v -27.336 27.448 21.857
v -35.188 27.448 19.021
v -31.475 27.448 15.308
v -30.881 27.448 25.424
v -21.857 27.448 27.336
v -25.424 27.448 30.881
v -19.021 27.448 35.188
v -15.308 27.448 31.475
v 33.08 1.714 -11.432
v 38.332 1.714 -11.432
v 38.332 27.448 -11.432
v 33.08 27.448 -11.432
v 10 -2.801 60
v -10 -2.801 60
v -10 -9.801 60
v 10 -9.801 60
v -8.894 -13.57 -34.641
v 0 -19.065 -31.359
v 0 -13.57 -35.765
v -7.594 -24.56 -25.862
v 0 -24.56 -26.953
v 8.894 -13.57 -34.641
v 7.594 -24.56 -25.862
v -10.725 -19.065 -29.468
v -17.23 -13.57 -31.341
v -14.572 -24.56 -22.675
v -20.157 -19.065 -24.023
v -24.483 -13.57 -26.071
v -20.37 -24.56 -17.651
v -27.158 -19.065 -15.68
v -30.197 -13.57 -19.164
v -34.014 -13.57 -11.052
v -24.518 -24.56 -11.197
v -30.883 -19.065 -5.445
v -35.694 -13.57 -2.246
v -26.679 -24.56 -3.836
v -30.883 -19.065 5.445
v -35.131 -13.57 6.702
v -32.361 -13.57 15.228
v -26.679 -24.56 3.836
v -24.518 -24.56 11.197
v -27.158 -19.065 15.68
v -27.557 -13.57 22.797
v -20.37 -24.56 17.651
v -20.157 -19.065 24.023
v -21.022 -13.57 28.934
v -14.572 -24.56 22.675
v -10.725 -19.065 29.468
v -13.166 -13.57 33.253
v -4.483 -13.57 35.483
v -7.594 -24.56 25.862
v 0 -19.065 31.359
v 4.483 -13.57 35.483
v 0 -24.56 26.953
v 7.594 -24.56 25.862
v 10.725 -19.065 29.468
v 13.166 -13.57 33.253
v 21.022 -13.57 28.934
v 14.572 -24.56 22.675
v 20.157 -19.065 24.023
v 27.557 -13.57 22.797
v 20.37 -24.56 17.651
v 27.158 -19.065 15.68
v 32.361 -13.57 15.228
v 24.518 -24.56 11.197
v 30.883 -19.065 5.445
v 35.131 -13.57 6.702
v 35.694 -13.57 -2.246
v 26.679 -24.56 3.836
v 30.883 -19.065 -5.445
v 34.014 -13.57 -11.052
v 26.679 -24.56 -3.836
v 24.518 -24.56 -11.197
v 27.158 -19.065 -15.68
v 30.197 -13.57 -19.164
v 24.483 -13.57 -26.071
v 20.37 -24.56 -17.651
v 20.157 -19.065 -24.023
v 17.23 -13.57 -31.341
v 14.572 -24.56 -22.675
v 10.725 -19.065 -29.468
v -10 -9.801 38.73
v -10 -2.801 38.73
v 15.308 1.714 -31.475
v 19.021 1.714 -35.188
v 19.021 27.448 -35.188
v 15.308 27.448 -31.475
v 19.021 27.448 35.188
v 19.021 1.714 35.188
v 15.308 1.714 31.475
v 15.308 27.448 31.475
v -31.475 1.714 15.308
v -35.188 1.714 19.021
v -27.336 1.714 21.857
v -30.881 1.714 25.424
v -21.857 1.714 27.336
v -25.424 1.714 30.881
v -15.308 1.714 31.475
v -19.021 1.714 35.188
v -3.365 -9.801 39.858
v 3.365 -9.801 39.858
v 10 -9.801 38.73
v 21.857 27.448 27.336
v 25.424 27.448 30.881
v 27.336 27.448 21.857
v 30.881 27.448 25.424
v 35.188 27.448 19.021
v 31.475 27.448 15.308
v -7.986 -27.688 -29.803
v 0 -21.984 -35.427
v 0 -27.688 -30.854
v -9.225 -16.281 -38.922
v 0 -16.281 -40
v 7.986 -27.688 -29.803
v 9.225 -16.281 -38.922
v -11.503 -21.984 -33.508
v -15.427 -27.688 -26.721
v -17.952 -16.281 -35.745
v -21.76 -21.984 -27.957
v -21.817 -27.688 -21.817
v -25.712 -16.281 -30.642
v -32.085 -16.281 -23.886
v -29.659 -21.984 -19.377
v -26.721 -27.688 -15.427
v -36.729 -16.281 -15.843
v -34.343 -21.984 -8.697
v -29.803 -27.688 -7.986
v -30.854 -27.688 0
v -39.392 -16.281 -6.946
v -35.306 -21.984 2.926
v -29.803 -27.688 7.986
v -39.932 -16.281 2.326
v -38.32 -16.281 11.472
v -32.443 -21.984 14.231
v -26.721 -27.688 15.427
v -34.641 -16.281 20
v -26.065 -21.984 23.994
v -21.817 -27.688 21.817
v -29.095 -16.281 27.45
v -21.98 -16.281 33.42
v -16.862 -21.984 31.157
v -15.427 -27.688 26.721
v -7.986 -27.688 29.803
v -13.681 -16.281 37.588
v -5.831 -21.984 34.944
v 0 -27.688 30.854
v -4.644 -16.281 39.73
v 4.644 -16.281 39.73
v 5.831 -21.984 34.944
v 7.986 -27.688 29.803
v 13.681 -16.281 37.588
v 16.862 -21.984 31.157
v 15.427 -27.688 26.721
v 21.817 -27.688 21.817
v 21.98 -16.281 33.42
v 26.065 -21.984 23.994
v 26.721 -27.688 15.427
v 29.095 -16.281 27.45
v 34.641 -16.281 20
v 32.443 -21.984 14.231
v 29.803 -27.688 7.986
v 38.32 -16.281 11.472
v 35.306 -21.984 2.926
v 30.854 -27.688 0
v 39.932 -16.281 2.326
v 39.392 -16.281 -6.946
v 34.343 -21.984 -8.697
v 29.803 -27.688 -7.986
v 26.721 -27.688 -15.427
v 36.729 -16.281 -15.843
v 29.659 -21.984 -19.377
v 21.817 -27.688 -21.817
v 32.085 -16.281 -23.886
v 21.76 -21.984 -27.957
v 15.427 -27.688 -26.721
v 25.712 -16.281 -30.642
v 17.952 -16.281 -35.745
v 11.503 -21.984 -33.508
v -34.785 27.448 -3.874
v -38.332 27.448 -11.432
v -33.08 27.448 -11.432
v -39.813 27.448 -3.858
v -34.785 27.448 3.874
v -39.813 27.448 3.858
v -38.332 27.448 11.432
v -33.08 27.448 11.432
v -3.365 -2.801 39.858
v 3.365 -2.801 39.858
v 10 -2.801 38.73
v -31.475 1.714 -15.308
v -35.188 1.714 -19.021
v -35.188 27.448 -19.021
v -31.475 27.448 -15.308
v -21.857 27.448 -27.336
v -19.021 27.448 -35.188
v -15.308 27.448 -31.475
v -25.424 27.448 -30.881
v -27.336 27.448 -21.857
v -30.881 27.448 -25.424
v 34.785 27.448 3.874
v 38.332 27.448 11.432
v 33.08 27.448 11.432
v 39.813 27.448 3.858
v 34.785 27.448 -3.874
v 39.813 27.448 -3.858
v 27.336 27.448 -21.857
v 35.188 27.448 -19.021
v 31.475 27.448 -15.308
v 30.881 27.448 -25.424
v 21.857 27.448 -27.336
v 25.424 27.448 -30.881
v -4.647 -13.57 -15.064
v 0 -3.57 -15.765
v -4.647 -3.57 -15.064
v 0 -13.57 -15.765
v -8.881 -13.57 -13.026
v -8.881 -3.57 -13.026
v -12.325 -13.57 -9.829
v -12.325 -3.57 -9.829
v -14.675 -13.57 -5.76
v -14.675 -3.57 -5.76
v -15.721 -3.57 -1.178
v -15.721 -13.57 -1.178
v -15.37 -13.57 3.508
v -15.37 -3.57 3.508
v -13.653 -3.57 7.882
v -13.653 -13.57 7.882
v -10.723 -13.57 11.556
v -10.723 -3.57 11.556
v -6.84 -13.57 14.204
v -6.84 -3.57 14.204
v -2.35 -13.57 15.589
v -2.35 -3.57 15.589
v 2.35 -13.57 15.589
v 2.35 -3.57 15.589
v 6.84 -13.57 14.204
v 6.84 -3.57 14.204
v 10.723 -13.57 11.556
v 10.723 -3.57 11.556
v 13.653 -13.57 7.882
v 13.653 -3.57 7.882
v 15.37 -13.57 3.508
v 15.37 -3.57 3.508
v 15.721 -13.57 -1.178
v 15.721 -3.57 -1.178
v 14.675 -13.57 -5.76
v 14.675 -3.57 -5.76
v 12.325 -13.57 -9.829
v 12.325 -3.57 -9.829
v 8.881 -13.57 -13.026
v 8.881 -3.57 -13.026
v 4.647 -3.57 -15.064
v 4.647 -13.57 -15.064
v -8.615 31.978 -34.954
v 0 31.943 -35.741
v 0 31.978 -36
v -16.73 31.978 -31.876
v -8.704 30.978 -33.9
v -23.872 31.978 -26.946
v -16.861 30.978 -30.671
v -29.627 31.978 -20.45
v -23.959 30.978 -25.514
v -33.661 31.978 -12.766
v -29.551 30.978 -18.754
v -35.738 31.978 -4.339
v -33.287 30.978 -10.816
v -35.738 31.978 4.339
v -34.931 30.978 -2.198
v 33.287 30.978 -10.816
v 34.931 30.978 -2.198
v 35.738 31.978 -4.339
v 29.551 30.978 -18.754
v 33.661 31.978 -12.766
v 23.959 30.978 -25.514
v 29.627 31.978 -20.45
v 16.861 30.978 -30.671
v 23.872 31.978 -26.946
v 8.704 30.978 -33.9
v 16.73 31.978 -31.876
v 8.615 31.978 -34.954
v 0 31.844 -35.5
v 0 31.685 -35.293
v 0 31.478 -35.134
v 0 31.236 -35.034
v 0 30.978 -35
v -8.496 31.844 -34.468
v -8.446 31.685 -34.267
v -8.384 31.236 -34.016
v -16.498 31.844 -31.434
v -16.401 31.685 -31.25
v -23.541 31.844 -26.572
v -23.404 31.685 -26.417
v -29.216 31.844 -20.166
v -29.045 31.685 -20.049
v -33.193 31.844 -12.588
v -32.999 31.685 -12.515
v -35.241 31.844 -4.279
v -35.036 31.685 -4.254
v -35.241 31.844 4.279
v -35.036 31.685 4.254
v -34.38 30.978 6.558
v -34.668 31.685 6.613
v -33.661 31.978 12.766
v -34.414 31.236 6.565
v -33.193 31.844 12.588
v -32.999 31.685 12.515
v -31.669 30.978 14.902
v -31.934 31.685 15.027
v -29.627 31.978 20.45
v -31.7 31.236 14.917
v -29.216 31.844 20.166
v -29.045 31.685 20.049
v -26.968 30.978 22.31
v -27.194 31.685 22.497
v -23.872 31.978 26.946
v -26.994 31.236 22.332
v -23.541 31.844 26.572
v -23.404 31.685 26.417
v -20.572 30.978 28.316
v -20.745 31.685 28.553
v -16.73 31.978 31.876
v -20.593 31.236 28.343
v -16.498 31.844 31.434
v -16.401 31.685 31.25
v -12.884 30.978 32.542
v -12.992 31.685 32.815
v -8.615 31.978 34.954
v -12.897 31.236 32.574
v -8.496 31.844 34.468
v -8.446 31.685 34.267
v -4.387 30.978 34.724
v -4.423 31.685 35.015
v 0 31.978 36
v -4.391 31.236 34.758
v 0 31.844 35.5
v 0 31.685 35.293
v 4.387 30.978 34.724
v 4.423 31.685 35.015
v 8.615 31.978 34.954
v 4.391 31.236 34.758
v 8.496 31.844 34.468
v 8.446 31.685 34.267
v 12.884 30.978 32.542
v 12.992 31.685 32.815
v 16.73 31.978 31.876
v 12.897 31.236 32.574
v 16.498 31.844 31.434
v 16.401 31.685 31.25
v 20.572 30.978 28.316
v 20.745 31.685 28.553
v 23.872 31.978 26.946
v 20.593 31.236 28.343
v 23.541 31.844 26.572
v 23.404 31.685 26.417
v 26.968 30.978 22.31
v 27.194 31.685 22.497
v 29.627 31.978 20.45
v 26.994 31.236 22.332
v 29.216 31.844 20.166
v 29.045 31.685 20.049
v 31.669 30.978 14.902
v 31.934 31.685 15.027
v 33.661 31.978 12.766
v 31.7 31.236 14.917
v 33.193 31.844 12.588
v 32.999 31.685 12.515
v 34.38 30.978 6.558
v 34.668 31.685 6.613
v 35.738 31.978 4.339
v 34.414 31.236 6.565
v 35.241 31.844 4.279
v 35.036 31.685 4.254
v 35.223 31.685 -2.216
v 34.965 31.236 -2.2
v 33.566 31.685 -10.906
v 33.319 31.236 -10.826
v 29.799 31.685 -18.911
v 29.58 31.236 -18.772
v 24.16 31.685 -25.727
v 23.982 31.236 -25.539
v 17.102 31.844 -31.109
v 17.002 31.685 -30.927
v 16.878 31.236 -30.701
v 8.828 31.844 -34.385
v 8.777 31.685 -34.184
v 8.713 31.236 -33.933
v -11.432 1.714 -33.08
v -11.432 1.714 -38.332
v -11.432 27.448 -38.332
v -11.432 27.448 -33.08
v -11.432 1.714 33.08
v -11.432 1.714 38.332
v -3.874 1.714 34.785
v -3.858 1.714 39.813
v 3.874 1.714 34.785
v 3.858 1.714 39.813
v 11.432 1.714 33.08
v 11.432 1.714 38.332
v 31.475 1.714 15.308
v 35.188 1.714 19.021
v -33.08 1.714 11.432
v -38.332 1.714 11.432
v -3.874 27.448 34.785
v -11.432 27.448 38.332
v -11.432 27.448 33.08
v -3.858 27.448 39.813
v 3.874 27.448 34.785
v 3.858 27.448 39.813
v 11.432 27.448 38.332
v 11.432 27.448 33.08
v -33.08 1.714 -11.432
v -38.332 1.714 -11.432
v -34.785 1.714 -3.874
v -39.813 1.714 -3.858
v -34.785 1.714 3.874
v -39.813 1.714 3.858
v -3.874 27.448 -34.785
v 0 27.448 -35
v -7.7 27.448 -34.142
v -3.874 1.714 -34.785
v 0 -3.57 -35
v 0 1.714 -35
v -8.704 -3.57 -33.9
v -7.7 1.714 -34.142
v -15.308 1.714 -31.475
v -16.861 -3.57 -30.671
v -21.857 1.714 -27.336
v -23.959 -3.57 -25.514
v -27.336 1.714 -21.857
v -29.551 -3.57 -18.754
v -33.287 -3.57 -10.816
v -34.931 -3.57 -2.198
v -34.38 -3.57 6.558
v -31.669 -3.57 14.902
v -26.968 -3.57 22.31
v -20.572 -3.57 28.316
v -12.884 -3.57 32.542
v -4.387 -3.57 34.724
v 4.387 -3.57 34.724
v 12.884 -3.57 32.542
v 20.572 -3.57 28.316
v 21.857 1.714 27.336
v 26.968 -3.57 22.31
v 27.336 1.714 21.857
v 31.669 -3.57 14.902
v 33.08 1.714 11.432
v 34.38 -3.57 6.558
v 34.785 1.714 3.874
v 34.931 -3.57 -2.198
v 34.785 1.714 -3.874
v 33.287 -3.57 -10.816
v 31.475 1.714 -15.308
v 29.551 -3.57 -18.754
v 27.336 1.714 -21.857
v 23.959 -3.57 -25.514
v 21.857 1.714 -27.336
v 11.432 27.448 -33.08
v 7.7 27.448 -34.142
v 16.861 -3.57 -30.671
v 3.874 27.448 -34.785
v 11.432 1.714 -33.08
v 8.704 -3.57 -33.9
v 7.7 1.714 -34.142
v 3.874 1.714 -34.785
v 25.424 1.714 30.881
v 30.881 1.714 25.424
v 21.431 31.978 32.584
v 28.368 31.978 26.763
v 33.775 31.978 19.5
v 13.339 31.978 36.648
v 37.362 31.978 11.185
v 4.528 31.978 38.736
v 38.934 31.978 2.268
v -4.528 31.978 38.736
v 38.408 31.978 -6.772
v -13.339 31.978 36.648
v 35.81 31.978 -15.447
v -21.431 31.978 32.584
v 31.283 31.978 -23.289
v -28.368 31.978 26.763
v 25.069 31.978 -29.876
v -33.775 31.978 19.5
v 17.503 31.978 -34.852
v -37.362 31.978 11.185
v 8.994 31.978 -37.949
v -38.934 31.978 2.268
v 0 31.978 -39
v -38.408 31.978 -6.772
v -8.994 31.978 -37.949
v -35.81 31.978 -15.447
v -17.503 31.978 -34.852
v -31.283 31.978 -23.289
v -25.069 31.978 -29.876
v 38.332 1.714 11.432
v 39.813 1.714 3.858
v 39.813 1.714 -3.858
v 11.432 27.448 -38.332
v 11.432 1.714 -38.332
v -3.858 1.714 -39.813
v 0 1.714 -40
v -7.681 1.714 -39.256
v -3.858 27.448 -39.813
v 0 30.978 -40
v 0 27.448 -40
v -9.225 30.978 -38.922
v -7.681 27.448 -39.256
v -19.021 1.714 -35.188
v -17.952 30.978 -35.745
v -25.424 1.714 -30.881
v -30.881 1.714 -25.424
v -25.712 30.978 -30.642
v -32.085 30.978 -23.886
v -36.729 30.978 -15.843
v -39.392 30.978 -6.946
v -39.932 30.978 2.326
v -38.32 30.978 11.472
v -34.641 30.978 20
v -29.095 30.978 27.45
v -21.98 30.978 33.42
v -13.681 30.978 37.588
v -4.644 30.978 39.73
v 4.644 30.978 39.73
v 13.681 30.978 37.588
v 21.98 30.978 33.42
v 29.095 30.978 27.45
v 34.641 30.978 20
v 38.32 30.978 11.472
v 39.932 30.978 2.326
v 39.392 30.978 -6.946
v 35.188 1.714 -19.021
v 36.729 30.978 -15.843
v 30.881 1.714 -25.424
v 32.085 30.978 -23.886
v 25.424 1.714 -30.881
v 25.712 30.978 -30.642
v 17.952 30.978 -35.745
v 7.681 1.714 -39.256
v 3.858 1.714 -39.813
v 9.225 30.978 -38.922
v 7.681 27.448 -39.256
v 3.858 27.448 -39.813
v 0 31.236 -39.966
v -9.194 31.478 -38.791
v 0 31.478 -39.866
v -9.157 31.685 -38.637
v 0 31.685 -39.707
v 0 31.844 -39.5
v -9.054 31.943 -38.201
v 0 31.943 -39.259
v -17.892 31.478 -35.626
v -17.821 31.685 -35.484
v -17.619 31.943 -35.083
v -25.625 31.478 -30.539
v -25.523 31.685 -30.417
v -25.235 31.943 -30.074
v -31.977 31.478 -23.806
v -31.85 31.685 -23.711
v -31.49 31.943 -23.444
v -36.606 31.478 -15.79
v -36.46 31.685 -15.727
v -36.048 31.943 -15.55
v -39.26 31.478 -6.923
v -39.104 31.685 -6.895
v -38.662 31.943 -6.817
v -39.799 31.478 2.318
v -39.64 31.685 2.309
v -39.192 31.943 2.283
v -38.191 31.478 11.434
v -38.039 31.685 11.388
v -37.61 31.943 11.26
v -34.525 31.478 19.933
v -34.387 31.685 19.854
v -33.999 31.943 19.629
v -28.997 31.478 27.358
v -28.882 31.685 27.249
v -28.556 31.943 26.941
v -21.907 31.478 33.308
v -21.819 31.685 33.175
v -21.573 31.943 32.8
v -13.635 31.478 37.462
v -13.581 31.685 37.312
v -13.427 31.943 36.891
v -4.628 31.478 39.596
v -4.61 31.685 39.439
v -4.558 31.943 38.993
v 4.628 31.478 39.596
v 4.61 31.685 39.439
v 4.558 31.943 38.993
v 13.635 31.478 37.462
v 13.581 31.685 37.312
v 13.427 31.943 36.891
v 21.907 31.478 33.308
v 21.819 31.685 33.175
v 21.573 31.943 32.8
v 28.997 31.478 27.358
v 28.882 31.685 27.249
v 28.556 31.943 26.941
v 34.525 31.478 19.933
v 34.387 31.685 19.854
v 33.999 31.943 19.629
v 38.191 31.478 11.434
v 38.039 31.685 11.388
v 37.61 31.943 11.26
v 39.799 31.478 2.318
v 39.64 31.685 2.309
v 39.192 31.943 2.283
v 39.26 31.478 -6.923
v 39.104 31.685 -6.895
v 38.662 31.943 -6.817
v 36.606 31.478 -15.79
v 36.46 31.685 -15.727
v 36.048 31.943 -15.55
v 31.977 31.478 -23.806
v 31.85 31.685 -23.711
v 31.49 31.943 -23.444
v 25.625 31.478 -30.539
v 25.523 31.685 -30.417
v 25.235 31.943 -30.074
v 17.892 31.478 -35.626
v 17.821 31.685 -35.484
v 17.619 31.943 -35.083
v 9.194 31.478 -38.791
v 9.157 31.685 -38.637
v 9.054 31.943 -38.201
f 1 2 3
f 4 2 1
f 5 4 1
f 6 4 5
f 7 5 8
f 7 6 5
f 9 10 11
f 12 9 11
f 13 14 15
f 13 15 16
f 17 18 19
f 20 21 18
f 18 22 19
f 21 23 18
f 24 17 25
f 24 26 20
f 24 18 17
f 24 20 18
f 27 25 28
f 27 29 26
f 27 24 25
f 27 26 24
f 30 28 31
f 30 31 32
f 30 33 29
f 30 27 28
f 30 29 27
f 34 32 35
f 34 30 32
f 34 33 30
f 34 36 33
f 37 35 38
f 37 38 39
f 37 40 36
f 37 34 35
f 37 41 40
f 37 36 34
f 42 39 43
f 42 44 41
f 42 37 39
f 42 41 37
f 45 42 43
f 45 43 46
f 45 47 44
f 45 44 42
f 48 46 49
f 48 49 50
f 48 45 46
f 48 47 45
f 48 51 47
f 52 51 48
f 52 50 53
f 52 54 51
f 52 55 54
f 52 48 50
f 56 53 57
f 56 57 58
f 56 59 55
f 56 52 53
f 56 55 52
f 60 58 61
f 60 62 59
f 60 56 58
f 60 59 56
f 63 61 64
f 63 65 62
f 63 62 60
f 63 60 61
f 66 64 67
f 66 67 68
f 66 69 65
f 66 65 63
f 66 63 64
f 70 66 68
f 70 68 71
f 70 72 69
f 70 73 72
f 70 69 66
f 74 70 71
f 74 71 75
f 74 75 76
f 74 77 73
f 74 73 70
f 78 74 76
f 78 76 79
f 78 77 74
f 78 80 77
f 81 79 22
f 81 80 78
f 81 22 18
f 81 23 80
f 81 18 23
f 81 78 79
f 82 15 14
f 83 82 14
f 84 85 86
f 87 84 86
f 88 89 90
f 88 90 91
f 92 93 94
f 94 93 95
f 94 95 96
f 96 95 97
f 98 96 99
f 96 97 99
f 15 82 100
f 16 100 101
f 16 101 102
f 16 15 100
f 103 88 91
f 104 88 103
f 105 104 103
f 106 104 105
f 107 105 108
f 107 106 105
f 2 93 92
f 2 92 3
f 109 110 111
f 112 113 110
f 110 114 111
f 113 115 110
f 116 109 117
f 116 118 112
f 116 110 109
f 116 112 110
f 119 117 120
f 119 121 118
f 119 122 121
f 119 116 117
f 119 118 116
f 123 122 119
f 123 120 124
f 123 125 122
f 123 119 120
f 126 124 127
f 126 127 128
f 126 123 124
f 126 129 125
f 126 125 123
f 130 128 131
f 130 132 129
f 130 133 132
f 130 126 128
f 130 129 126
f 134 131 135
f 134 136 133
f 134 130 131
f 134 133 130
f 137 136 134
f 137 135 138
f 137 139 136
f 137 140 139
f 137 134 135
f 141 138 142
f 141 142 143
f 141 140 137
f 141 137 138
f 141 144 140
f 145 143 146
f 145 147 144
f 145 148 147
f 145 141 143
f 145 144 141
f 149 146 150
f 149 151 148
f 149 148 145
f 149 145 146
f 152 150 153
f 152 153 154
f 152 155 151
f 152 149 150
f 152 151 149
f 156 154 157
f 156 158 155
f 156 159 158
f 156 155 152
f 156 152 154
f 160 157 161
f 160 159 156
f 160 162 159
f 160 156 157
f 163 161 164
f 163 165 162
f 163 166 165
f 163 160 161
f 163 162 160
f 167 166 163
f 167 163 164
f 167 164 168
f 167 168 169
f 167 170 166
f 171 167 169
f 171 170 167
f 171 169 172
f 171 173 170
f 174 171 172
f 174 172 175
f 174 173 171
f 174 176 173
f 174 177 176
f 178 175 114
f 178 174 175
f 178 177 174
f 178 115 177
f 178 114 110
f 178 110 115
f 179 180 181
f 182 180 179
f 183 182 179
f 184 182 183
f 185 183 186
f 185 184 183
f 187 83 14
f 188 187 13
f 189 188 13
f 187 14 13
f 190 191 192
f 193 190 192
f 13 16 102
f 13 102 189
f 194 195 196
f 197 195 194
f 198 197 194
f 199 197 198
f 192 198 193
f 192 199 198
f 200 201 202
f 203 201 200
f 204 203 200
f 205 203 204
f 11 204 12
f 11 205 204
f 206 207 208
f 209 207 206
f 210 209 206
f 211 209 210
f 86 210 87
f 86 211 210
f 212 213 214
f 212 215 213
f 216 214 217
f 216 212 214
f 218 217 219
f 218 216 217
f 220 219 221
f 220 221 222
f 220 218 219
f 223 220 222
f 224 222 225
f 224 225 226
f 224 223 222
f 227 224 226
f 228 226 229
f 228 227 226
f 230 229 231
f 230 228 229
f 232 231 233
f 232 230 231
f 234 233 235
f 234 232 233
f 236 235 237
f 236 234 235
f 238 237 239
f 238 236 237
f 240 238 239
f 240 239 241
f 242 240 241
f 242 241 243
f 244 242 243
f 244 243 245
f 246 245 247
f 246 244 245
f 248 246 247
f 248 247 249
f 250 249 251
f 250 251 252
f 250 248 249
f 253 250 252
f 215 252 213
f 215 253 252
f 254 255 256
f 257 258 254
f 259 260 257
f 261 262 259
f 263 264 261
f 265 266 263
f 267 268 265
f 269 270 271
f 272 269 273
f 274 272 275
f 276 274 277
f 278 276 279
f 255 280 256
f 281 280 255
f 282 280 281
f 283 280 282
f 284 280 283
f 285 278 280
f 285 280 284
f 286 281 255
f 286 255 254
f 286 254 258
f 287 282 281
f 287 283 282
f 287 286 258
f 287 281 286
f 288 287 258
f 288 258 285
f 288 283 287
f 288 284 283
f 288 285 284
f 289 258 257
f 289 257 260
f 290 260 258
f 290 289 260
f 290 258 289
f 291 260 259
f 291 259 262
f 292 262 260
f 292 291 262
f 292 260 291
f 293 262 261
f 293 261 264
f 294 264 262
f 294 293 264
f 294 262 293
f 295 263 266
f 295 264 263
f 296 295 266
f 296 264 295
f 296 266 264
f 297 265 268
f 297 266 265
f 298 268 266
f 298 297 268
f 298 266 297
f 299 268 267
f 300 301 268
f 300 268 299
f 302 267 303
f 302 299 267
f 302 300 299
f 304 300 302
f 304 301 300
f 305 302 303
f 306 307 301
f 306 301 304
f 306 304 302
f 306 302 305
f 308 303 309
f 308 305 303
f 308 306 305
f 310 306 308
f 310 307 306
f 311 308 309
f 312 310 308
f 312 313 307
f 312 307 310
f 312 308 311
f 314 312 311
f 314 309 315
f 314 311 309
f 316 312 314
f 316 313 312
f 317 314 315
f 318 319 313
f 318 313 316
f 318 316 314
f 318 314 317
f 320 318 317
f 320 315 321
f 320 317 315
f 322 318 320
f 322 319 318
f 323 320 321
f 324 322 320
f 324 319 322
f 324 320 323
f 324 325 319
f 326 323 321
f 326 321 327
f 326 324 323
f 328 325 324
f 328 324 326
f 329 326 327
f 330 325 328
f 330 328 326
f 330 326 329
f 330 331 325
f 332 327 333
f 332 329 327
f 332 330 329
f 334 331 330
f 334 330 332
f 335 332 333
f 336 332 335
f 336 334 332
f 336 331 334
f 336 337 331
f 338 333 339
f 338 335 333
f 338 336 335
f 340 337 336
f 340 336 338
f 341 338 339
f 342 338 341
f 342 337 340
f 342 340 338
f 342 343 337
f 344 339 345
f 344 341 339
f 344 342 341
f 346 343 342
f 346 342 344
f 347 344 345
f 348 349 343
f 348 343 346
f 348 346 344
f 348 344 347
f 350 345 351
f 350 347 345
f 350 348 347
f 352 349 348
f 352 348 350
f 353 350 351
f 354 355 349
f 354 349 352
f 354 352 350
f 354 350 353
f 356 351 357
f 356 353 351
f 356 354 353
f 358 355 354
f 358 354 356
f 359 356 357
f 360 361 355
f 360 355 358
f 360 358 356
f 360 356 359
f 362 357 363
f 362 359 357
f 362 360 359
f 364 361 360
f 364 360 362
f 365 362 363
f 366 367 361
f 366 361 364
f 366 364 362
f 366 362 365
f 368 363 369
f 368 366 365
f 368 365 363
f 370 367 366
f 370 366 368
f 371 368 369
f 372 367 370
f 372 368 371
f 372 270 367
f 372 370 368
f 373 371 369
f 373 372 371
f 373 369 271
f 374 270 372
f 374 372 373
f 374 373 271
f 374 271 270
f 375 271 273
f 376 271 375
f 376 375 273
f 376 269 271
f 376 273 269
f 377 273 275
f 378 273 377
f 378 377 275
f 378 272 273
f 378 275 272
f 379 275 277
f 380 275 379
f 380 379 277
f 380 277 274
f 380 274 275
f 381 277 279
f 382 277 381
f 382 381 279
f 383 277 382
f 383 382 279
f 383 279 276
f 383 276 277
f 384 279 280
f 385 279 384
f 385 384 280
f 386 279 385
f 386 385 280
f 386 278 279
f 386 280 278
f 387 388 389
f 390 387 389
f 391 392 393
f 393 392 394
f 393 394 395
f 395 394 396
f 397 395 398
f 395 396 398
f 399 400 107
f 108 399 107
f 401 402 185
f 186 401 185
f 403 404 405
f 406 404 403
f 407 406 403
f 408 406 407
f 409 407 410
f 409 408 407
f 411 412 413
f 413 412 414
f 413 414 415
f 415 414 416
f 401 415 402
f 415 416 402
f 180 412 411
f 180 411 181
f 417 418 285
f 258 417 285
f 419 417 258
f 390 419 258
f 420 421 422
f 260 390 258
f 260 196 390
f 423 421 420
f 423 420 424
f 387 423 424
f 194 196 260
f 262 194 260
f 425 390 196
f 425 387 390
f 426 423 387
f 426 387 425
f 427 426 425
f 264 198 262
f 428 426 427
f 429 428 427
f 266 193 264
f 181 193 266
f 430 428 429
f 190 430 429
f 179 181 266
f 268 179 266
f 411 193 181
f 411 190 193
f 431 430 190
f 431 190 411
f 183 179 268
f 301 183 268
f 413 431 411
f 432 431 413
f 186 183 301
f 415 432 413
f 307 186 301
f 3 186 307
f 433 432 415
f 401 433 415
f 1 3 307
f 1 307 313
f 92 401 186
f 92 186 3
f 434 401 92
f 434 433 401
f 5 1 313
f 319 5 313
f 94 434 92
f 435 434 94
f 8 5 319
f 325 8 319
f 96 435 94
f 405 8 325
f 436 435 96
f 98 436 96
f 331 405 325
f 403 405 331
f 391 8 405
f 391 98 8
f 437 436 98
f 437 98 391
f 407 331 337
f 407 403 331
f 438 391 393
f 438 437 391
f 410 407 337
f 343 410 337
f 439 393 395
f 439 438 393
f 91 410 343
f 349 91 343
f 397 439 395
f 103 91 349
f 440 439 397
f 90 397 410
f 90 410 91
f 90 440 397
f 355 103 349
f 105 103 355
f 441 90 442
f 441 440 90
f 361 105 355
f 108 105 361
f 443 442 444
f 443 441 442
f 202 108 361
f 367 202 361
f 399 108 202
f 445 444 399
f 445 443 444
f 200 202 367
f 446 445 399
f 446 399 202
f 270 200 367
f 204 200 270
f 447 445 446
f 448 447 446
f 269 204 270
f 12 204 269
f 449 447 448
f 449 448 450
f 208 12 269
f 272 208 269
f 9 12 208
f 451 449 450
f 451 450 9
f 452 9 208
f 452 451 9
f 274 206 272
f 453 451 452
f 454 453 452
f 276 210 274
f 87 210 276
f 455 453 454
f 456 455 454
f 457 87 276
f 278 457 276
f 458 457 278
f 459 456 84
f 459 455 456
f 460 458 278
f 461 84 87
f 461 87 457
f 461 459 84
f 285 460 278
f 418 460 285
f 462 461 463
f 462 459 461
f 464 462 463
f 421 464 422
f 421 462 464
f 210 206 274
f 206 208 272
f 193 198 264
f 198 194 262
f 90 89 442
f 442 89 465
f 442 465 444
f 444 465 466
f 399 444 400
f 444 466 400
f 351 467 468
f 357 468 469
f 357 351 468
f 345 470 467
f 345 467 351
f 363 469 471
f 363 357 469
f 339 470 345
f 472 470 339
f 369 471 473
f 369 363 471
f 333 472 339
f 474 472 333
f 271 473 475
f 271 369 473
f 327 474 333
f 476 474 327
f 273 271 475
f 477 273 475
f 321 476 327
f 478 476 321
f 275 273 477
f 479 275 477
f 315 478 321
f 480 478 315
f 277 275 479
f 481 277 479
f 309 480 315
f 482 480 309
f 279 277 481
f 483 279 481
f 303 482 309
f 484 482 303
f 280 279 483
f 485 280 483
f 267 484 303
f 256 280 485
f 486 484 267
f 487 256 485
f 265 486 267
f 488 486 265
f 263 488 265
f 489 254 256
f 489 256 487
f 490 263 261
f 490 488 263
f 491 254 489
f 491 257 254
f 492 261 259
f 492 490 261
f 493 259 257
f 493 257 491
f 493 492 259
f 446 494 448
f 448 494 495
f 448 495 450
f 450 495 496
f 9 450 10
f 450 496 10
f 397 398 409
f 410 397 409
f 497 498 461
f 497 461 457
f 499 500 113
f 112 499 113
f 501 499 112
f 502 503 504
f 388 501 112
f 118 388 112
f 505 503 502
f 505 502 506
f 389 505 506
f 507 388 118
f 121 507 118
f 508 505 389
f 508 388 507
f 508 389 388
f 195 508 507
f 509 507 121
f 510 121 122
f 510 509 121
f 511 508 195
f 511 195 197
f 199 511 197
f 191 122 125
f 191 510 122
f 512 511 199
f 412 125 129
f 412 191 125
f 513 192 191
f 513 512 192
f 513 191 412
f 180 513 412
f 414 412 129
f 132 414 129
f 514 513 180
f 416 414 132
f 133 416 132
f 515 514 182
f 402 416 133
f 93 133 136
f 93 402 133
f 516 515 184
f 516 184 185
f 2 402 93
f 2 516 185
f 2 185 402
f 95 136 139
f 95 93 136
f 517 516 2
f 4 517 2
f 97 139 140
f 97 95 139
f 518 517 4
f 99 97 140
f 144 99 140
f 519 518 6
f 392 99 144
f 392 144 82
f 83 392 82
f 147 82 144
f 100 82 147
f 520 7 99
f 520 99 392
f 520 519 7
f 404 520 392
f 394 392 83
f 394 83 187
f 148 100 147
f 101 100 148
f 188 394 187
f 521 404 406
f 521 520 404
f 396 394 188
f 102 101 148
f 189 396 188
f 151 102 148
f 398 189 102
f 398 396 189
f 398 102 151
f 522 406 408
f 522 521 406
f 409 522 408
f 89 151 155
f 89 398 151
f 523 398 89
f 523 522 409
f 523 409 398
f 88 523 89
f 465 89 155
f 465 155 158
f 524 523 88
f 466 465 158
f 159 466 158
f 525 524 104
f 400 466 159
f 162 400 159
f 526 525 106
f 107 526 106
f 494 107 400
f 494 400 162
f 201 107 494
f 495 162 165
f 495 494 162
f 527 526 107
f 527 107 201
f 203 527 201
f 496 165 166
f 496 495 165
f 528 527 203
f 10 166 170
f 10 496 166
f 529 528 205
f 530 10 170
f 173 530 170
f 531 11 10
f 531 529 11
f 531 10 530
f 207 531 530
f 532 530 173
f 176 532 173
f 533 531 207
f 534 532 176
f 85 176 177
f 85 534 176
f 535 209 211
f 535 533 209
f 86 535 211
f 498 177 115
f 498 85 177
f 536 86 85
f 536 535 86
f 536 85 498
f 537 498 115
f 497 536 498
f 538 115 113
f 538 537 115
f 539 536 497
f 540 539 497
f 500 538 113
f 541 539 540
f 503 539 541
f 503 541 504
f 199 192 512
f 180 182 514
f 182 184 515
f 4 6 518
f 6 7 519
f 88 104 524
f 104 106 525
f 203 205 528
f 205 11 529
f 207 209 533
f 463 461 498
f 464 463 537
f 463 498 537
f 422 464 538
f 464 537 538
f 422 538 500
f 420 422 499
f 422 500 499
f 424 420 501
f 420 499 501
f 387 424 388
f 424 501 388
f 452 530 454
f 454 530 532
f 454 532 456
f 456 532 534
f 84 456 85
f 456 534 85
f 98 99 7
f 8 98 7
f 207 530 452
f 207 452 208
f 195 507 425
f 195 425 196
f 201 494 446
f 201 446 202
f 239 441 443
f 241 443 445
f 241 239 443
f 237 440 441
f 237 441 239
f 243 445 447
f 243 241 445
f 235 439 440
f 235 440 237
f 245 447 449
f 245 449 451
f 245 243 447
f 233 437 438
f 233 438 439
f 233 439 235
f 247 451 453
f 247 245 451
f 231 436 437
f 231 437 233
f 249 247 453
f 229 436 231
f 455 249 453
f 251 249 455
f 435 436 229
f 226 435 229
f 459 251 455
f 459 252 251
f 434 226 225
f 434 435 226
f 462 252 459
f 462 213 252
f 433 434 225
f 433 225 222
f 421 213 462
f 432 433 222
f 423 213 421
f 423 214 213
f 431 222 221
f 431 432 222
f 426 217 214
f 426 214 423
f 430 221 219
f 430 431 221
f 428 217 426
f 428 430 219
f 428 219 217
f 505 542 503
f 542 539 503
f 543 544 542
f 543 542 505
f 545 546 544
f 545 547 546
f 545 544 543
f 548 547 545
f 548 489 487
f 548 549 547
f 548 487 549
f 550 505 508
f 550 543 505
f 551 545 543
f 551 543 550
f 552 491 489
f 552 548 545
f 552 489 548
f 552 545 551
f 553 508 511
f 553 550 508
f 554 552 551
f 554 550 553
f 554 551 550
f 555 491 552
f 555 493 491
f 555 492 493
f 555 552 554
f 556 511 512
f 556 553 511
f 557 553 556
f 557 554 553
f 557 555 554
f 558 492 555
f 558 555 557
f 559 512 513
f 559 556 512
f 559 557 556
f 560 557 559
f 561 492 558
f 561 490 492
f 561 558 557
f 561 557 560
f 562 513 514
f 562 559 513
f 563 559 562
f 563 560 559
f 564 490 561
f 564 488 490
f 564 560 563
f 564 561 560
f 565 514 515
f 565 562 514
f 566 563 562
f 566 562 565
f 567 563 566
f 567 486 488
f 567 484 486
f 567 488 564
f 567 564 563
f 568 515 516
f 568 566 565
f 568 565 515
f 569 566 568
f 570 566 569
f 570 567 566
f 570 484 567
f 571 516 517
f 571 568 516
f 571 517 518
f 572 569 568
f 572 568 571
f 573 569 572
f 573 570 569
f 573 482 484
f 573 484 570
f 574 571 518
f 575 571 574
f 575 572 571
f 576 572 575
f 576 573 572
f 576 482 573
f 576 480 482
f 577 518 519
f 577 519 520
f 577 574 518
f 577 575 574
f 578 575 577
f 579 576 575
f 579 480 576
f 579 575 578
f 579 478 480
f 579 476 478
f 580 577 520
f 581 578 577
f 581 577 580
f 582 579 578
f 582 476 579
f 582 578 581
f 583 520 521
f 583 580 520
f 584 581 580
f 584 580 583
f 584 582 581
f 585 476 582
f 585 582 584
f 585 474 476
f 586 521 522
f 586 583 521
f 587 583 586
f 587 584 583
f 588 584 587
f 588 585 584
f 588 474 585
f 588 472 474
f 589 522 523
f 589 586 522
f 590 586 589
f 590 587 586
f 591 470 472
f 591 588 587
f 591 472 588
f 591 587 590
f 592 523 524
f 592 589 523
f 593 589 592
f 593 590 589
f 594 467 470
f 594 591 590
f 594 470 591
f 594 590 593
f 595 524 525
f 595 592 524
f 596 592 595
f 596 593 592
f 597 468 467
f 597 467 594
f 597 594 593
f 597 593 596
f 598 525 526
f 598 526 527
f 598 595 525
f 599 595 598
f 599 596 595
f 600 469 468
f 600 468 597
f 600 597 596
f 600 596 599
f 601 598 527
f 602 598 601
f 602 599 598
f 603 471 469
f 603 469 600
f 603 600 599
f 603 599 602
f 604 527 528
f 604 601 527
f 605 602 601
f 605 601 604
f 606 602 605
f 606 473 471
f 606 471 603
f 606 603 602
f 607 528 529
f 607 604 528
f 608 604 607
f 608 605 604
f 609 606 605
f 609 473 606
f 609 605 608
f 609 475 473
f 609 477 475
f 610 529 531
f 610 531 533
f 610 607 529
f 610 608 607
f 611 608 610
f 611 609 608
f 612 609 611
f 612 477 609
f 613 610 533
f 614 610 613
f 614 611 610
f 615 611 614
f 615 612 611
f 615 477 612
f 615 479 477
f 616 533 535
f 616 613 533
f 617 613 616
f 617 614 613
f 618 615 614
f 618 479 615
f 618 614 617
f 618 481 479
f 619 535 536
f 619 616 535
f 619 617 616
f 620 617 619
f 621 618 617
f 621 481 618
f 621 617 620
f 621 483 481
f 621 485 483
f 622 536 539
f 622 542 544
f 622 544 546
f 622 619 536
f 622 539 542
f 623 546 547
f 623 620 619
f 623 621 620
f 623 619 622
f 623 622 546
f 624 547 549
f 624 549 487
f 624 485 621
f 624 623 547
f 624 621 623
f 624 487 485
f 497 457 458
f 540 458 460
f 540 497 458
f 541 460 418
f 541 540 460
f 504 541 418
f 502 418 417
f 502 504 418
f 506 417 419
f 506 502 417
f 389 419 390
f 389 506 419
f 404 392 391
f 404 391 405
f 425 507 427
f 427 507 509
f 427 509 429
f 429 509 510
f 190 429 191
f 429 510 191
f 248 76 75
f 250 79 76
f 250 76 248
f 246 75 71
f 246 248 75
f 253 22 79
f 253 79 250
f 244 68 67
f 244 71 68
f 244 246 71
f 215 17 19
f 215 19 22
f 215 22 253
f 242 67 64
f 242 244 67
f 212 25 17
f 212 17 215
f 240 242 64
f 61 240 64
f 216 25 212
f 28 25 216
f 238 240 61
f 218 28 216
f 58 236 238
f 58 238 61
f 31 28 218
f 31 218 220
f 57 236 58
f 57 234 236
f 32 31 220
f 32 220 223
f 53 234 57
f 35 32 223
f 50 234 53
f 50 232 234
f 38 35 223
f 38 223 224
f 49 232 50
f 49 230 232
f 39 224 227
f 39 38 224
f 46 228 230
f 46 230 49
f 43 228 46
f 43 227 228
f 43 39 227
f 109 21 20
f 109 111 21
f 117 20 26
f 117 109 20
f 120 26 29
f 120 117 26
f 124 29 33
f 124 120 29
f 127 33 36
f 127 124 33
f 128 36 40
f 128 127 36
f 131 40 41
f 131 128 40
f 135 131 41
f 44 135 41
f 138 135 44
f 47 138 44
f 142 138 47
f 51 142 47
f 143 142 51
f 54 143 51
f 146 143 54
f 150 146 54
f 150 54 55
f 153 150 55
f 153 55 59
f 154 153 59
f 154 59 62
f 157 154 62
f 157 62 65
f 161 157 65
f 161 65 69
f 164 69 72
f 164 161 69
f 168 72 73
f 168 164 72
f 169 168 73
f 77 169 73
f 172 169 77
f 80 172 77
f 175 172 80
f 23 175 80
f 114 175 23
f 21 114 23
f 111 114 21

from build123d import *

# Parameters (mm, degrees)
CUT_EXTRUDE_7_REACH              = 96.987
CUT_EXTRUDE_7_END_RADIUS         = 35
SKETCH_9_W                       = 22.863653518
SKETCH_9_H                       = 25.734556693
PATTERN_CIRCULAR_3_COUNT         = 8
SKETCH_11_W                      = 20
SKETCH_11_H                      = 7
EXTRUDE_1_DEPTH                  = 20
EXTRUDE_1_DIRECTION_2_REACH      = 96.987
EXTRUDE_1_DIRECTION_2_END_RADIUS = 40


with BuildPart() as part:
    # 草图1 → 旋转4 (revolve)
    with BuildSketch(Plane.XY, mode=Mode.PRIVATE) as revolve_4_sk:
        with BuildLine():
            Line((-35.764870687, -13.569622936), (-26.953430159, -24.560221363))
            Line((-26.953430159, -24.560221363), (-30.85448893, -27.687798773))
            Line((-30.85448893, -27.687798773), (-40, -16.2805108))
            Line((-40, -16.2805108), (-40, 30.977562367))
            ThreePointArc((-40, 30.977562367), (-39.707106781, 31.684669148), (-39, 31.977562367))
            Line((-39, 31.977562367), (-36, 31.977562367))
            ThreePointArc((-36, 31.977562367), (-35.292893219, 31.684669148), (-35, 30.977562367))
            Line((-35, 30.977562367), (-35, -3.569622936))
            Line((-35, -3.569622936), (-15.764870687, -3.569622936))
            Line((-15.764870687, -3.569622936), (-15.764870687, -13.569622936))
            Line((-15.764870687, -13.569622936), (-35.764870687, -13.569622936))
        make_face()
    revolve(revolve_4_sk.sketch.rotate(Axis((0, 0, 0), (0, 1, 0)), 270), axis=Axis((0, 0, 0), (0, 1, 0)))

    # 切除-拉伸7: up to this cylinder (the profile starts outside it)
    cut_extrude_7_end = Plane(origin=(0, 14.581038, 0), z_dir=(0, -1, 0)) * Cylinder(CUT_EXTRUDE_7_END_RADIUS, 264.974, mode=Mode.PRIVATE)
    # 草图9 → 切除-拉伸7 (cut, up to the surface)
    with BuildSketch(Plane.XY.offset(40), mode=Mode.PRIVATE) as cut_extrude_7_sk1:
        with Locations((0, 14.581037932)):
            Rectangle(SKETCH_9_W, SKETCH_9_H)
    cut_extrude_7_tool1 = extrude(cut_extrude_7_sk1.sketch, amount=-CUT_EXTRUDE_7_REACH, mode=Mode.PRIVATE) - cut_extrude_7_end
    cut_extrude_7 = cut_extrude_7_tool1.solids().sort_by_distance((0, 14.581038, 40))[0]
    add(cut_extrude_7, mode=Mode.SUBTRACT)

    # 阵列(圆周)3: 切除-拉伸7 ×8 about axis
    pattern_circular_3_axis = Axis((0, 0, 0), (0, 1, 0))
    for i in range(1, PATTERN_CIRCULAR_3_COUNT):
        add(cut_extrude_7.rotate(pattern_circular_3_axis, i * 360 / PATTERN_CIRCULAR_3_COUNT), mode=Mode.SUBTRACT)

    # 草图11 → 凸台-拉伸1 (add)
    with BuildSketch(Plane.XY.offset(40)):
        with Locations((0, -6.301485772)):
            Rectangle(SKETCH_11_W, SKETCH_11_H)
    extrude(amount=EXTRUDE_1_DEPTH)

    # 凸台-拉伸1 direction 2: up to this cylinder (the profile starts outside it)
    extrude_1_direction_2_end = Plane(origin=(0, -6.301486, 0), z_dir=(0, -1, 0)) * Cylinder(EXTRUDE_1_DIRECTION_2_END_RADIUS, 274.974, mode=Mode.PRIVATE)
    # 草图11 → 凸台-拉伸1 direction 2 (add, up to the surface)
    with BuildSketch(Plane.XY.offset(40), mode=Mode.PRIVATE) as extrude_1_direction_2_sk1:
        with Locations((0, -6.301485772)):
            Rectangle(SKETCH_11_W, SKETCH_11_H)
    extrude_1_direction_2_tool1 = extrude(extrude_1_direction_2_sk1.sketch, amount=-EXTRUDE_1_DIRECTION_2_REACH, mode=Mode.PRIVATE) - extrude_1_direction_2_end
    add(extrude_1_direction_2_tool1.solids().sort_by_distance((0, -6.301486, 40))[0])
    add(extrude_1_direction_2_tool1.solids().sort_by_distance((0, -6.301486, 40))[1])


solid = part.part
